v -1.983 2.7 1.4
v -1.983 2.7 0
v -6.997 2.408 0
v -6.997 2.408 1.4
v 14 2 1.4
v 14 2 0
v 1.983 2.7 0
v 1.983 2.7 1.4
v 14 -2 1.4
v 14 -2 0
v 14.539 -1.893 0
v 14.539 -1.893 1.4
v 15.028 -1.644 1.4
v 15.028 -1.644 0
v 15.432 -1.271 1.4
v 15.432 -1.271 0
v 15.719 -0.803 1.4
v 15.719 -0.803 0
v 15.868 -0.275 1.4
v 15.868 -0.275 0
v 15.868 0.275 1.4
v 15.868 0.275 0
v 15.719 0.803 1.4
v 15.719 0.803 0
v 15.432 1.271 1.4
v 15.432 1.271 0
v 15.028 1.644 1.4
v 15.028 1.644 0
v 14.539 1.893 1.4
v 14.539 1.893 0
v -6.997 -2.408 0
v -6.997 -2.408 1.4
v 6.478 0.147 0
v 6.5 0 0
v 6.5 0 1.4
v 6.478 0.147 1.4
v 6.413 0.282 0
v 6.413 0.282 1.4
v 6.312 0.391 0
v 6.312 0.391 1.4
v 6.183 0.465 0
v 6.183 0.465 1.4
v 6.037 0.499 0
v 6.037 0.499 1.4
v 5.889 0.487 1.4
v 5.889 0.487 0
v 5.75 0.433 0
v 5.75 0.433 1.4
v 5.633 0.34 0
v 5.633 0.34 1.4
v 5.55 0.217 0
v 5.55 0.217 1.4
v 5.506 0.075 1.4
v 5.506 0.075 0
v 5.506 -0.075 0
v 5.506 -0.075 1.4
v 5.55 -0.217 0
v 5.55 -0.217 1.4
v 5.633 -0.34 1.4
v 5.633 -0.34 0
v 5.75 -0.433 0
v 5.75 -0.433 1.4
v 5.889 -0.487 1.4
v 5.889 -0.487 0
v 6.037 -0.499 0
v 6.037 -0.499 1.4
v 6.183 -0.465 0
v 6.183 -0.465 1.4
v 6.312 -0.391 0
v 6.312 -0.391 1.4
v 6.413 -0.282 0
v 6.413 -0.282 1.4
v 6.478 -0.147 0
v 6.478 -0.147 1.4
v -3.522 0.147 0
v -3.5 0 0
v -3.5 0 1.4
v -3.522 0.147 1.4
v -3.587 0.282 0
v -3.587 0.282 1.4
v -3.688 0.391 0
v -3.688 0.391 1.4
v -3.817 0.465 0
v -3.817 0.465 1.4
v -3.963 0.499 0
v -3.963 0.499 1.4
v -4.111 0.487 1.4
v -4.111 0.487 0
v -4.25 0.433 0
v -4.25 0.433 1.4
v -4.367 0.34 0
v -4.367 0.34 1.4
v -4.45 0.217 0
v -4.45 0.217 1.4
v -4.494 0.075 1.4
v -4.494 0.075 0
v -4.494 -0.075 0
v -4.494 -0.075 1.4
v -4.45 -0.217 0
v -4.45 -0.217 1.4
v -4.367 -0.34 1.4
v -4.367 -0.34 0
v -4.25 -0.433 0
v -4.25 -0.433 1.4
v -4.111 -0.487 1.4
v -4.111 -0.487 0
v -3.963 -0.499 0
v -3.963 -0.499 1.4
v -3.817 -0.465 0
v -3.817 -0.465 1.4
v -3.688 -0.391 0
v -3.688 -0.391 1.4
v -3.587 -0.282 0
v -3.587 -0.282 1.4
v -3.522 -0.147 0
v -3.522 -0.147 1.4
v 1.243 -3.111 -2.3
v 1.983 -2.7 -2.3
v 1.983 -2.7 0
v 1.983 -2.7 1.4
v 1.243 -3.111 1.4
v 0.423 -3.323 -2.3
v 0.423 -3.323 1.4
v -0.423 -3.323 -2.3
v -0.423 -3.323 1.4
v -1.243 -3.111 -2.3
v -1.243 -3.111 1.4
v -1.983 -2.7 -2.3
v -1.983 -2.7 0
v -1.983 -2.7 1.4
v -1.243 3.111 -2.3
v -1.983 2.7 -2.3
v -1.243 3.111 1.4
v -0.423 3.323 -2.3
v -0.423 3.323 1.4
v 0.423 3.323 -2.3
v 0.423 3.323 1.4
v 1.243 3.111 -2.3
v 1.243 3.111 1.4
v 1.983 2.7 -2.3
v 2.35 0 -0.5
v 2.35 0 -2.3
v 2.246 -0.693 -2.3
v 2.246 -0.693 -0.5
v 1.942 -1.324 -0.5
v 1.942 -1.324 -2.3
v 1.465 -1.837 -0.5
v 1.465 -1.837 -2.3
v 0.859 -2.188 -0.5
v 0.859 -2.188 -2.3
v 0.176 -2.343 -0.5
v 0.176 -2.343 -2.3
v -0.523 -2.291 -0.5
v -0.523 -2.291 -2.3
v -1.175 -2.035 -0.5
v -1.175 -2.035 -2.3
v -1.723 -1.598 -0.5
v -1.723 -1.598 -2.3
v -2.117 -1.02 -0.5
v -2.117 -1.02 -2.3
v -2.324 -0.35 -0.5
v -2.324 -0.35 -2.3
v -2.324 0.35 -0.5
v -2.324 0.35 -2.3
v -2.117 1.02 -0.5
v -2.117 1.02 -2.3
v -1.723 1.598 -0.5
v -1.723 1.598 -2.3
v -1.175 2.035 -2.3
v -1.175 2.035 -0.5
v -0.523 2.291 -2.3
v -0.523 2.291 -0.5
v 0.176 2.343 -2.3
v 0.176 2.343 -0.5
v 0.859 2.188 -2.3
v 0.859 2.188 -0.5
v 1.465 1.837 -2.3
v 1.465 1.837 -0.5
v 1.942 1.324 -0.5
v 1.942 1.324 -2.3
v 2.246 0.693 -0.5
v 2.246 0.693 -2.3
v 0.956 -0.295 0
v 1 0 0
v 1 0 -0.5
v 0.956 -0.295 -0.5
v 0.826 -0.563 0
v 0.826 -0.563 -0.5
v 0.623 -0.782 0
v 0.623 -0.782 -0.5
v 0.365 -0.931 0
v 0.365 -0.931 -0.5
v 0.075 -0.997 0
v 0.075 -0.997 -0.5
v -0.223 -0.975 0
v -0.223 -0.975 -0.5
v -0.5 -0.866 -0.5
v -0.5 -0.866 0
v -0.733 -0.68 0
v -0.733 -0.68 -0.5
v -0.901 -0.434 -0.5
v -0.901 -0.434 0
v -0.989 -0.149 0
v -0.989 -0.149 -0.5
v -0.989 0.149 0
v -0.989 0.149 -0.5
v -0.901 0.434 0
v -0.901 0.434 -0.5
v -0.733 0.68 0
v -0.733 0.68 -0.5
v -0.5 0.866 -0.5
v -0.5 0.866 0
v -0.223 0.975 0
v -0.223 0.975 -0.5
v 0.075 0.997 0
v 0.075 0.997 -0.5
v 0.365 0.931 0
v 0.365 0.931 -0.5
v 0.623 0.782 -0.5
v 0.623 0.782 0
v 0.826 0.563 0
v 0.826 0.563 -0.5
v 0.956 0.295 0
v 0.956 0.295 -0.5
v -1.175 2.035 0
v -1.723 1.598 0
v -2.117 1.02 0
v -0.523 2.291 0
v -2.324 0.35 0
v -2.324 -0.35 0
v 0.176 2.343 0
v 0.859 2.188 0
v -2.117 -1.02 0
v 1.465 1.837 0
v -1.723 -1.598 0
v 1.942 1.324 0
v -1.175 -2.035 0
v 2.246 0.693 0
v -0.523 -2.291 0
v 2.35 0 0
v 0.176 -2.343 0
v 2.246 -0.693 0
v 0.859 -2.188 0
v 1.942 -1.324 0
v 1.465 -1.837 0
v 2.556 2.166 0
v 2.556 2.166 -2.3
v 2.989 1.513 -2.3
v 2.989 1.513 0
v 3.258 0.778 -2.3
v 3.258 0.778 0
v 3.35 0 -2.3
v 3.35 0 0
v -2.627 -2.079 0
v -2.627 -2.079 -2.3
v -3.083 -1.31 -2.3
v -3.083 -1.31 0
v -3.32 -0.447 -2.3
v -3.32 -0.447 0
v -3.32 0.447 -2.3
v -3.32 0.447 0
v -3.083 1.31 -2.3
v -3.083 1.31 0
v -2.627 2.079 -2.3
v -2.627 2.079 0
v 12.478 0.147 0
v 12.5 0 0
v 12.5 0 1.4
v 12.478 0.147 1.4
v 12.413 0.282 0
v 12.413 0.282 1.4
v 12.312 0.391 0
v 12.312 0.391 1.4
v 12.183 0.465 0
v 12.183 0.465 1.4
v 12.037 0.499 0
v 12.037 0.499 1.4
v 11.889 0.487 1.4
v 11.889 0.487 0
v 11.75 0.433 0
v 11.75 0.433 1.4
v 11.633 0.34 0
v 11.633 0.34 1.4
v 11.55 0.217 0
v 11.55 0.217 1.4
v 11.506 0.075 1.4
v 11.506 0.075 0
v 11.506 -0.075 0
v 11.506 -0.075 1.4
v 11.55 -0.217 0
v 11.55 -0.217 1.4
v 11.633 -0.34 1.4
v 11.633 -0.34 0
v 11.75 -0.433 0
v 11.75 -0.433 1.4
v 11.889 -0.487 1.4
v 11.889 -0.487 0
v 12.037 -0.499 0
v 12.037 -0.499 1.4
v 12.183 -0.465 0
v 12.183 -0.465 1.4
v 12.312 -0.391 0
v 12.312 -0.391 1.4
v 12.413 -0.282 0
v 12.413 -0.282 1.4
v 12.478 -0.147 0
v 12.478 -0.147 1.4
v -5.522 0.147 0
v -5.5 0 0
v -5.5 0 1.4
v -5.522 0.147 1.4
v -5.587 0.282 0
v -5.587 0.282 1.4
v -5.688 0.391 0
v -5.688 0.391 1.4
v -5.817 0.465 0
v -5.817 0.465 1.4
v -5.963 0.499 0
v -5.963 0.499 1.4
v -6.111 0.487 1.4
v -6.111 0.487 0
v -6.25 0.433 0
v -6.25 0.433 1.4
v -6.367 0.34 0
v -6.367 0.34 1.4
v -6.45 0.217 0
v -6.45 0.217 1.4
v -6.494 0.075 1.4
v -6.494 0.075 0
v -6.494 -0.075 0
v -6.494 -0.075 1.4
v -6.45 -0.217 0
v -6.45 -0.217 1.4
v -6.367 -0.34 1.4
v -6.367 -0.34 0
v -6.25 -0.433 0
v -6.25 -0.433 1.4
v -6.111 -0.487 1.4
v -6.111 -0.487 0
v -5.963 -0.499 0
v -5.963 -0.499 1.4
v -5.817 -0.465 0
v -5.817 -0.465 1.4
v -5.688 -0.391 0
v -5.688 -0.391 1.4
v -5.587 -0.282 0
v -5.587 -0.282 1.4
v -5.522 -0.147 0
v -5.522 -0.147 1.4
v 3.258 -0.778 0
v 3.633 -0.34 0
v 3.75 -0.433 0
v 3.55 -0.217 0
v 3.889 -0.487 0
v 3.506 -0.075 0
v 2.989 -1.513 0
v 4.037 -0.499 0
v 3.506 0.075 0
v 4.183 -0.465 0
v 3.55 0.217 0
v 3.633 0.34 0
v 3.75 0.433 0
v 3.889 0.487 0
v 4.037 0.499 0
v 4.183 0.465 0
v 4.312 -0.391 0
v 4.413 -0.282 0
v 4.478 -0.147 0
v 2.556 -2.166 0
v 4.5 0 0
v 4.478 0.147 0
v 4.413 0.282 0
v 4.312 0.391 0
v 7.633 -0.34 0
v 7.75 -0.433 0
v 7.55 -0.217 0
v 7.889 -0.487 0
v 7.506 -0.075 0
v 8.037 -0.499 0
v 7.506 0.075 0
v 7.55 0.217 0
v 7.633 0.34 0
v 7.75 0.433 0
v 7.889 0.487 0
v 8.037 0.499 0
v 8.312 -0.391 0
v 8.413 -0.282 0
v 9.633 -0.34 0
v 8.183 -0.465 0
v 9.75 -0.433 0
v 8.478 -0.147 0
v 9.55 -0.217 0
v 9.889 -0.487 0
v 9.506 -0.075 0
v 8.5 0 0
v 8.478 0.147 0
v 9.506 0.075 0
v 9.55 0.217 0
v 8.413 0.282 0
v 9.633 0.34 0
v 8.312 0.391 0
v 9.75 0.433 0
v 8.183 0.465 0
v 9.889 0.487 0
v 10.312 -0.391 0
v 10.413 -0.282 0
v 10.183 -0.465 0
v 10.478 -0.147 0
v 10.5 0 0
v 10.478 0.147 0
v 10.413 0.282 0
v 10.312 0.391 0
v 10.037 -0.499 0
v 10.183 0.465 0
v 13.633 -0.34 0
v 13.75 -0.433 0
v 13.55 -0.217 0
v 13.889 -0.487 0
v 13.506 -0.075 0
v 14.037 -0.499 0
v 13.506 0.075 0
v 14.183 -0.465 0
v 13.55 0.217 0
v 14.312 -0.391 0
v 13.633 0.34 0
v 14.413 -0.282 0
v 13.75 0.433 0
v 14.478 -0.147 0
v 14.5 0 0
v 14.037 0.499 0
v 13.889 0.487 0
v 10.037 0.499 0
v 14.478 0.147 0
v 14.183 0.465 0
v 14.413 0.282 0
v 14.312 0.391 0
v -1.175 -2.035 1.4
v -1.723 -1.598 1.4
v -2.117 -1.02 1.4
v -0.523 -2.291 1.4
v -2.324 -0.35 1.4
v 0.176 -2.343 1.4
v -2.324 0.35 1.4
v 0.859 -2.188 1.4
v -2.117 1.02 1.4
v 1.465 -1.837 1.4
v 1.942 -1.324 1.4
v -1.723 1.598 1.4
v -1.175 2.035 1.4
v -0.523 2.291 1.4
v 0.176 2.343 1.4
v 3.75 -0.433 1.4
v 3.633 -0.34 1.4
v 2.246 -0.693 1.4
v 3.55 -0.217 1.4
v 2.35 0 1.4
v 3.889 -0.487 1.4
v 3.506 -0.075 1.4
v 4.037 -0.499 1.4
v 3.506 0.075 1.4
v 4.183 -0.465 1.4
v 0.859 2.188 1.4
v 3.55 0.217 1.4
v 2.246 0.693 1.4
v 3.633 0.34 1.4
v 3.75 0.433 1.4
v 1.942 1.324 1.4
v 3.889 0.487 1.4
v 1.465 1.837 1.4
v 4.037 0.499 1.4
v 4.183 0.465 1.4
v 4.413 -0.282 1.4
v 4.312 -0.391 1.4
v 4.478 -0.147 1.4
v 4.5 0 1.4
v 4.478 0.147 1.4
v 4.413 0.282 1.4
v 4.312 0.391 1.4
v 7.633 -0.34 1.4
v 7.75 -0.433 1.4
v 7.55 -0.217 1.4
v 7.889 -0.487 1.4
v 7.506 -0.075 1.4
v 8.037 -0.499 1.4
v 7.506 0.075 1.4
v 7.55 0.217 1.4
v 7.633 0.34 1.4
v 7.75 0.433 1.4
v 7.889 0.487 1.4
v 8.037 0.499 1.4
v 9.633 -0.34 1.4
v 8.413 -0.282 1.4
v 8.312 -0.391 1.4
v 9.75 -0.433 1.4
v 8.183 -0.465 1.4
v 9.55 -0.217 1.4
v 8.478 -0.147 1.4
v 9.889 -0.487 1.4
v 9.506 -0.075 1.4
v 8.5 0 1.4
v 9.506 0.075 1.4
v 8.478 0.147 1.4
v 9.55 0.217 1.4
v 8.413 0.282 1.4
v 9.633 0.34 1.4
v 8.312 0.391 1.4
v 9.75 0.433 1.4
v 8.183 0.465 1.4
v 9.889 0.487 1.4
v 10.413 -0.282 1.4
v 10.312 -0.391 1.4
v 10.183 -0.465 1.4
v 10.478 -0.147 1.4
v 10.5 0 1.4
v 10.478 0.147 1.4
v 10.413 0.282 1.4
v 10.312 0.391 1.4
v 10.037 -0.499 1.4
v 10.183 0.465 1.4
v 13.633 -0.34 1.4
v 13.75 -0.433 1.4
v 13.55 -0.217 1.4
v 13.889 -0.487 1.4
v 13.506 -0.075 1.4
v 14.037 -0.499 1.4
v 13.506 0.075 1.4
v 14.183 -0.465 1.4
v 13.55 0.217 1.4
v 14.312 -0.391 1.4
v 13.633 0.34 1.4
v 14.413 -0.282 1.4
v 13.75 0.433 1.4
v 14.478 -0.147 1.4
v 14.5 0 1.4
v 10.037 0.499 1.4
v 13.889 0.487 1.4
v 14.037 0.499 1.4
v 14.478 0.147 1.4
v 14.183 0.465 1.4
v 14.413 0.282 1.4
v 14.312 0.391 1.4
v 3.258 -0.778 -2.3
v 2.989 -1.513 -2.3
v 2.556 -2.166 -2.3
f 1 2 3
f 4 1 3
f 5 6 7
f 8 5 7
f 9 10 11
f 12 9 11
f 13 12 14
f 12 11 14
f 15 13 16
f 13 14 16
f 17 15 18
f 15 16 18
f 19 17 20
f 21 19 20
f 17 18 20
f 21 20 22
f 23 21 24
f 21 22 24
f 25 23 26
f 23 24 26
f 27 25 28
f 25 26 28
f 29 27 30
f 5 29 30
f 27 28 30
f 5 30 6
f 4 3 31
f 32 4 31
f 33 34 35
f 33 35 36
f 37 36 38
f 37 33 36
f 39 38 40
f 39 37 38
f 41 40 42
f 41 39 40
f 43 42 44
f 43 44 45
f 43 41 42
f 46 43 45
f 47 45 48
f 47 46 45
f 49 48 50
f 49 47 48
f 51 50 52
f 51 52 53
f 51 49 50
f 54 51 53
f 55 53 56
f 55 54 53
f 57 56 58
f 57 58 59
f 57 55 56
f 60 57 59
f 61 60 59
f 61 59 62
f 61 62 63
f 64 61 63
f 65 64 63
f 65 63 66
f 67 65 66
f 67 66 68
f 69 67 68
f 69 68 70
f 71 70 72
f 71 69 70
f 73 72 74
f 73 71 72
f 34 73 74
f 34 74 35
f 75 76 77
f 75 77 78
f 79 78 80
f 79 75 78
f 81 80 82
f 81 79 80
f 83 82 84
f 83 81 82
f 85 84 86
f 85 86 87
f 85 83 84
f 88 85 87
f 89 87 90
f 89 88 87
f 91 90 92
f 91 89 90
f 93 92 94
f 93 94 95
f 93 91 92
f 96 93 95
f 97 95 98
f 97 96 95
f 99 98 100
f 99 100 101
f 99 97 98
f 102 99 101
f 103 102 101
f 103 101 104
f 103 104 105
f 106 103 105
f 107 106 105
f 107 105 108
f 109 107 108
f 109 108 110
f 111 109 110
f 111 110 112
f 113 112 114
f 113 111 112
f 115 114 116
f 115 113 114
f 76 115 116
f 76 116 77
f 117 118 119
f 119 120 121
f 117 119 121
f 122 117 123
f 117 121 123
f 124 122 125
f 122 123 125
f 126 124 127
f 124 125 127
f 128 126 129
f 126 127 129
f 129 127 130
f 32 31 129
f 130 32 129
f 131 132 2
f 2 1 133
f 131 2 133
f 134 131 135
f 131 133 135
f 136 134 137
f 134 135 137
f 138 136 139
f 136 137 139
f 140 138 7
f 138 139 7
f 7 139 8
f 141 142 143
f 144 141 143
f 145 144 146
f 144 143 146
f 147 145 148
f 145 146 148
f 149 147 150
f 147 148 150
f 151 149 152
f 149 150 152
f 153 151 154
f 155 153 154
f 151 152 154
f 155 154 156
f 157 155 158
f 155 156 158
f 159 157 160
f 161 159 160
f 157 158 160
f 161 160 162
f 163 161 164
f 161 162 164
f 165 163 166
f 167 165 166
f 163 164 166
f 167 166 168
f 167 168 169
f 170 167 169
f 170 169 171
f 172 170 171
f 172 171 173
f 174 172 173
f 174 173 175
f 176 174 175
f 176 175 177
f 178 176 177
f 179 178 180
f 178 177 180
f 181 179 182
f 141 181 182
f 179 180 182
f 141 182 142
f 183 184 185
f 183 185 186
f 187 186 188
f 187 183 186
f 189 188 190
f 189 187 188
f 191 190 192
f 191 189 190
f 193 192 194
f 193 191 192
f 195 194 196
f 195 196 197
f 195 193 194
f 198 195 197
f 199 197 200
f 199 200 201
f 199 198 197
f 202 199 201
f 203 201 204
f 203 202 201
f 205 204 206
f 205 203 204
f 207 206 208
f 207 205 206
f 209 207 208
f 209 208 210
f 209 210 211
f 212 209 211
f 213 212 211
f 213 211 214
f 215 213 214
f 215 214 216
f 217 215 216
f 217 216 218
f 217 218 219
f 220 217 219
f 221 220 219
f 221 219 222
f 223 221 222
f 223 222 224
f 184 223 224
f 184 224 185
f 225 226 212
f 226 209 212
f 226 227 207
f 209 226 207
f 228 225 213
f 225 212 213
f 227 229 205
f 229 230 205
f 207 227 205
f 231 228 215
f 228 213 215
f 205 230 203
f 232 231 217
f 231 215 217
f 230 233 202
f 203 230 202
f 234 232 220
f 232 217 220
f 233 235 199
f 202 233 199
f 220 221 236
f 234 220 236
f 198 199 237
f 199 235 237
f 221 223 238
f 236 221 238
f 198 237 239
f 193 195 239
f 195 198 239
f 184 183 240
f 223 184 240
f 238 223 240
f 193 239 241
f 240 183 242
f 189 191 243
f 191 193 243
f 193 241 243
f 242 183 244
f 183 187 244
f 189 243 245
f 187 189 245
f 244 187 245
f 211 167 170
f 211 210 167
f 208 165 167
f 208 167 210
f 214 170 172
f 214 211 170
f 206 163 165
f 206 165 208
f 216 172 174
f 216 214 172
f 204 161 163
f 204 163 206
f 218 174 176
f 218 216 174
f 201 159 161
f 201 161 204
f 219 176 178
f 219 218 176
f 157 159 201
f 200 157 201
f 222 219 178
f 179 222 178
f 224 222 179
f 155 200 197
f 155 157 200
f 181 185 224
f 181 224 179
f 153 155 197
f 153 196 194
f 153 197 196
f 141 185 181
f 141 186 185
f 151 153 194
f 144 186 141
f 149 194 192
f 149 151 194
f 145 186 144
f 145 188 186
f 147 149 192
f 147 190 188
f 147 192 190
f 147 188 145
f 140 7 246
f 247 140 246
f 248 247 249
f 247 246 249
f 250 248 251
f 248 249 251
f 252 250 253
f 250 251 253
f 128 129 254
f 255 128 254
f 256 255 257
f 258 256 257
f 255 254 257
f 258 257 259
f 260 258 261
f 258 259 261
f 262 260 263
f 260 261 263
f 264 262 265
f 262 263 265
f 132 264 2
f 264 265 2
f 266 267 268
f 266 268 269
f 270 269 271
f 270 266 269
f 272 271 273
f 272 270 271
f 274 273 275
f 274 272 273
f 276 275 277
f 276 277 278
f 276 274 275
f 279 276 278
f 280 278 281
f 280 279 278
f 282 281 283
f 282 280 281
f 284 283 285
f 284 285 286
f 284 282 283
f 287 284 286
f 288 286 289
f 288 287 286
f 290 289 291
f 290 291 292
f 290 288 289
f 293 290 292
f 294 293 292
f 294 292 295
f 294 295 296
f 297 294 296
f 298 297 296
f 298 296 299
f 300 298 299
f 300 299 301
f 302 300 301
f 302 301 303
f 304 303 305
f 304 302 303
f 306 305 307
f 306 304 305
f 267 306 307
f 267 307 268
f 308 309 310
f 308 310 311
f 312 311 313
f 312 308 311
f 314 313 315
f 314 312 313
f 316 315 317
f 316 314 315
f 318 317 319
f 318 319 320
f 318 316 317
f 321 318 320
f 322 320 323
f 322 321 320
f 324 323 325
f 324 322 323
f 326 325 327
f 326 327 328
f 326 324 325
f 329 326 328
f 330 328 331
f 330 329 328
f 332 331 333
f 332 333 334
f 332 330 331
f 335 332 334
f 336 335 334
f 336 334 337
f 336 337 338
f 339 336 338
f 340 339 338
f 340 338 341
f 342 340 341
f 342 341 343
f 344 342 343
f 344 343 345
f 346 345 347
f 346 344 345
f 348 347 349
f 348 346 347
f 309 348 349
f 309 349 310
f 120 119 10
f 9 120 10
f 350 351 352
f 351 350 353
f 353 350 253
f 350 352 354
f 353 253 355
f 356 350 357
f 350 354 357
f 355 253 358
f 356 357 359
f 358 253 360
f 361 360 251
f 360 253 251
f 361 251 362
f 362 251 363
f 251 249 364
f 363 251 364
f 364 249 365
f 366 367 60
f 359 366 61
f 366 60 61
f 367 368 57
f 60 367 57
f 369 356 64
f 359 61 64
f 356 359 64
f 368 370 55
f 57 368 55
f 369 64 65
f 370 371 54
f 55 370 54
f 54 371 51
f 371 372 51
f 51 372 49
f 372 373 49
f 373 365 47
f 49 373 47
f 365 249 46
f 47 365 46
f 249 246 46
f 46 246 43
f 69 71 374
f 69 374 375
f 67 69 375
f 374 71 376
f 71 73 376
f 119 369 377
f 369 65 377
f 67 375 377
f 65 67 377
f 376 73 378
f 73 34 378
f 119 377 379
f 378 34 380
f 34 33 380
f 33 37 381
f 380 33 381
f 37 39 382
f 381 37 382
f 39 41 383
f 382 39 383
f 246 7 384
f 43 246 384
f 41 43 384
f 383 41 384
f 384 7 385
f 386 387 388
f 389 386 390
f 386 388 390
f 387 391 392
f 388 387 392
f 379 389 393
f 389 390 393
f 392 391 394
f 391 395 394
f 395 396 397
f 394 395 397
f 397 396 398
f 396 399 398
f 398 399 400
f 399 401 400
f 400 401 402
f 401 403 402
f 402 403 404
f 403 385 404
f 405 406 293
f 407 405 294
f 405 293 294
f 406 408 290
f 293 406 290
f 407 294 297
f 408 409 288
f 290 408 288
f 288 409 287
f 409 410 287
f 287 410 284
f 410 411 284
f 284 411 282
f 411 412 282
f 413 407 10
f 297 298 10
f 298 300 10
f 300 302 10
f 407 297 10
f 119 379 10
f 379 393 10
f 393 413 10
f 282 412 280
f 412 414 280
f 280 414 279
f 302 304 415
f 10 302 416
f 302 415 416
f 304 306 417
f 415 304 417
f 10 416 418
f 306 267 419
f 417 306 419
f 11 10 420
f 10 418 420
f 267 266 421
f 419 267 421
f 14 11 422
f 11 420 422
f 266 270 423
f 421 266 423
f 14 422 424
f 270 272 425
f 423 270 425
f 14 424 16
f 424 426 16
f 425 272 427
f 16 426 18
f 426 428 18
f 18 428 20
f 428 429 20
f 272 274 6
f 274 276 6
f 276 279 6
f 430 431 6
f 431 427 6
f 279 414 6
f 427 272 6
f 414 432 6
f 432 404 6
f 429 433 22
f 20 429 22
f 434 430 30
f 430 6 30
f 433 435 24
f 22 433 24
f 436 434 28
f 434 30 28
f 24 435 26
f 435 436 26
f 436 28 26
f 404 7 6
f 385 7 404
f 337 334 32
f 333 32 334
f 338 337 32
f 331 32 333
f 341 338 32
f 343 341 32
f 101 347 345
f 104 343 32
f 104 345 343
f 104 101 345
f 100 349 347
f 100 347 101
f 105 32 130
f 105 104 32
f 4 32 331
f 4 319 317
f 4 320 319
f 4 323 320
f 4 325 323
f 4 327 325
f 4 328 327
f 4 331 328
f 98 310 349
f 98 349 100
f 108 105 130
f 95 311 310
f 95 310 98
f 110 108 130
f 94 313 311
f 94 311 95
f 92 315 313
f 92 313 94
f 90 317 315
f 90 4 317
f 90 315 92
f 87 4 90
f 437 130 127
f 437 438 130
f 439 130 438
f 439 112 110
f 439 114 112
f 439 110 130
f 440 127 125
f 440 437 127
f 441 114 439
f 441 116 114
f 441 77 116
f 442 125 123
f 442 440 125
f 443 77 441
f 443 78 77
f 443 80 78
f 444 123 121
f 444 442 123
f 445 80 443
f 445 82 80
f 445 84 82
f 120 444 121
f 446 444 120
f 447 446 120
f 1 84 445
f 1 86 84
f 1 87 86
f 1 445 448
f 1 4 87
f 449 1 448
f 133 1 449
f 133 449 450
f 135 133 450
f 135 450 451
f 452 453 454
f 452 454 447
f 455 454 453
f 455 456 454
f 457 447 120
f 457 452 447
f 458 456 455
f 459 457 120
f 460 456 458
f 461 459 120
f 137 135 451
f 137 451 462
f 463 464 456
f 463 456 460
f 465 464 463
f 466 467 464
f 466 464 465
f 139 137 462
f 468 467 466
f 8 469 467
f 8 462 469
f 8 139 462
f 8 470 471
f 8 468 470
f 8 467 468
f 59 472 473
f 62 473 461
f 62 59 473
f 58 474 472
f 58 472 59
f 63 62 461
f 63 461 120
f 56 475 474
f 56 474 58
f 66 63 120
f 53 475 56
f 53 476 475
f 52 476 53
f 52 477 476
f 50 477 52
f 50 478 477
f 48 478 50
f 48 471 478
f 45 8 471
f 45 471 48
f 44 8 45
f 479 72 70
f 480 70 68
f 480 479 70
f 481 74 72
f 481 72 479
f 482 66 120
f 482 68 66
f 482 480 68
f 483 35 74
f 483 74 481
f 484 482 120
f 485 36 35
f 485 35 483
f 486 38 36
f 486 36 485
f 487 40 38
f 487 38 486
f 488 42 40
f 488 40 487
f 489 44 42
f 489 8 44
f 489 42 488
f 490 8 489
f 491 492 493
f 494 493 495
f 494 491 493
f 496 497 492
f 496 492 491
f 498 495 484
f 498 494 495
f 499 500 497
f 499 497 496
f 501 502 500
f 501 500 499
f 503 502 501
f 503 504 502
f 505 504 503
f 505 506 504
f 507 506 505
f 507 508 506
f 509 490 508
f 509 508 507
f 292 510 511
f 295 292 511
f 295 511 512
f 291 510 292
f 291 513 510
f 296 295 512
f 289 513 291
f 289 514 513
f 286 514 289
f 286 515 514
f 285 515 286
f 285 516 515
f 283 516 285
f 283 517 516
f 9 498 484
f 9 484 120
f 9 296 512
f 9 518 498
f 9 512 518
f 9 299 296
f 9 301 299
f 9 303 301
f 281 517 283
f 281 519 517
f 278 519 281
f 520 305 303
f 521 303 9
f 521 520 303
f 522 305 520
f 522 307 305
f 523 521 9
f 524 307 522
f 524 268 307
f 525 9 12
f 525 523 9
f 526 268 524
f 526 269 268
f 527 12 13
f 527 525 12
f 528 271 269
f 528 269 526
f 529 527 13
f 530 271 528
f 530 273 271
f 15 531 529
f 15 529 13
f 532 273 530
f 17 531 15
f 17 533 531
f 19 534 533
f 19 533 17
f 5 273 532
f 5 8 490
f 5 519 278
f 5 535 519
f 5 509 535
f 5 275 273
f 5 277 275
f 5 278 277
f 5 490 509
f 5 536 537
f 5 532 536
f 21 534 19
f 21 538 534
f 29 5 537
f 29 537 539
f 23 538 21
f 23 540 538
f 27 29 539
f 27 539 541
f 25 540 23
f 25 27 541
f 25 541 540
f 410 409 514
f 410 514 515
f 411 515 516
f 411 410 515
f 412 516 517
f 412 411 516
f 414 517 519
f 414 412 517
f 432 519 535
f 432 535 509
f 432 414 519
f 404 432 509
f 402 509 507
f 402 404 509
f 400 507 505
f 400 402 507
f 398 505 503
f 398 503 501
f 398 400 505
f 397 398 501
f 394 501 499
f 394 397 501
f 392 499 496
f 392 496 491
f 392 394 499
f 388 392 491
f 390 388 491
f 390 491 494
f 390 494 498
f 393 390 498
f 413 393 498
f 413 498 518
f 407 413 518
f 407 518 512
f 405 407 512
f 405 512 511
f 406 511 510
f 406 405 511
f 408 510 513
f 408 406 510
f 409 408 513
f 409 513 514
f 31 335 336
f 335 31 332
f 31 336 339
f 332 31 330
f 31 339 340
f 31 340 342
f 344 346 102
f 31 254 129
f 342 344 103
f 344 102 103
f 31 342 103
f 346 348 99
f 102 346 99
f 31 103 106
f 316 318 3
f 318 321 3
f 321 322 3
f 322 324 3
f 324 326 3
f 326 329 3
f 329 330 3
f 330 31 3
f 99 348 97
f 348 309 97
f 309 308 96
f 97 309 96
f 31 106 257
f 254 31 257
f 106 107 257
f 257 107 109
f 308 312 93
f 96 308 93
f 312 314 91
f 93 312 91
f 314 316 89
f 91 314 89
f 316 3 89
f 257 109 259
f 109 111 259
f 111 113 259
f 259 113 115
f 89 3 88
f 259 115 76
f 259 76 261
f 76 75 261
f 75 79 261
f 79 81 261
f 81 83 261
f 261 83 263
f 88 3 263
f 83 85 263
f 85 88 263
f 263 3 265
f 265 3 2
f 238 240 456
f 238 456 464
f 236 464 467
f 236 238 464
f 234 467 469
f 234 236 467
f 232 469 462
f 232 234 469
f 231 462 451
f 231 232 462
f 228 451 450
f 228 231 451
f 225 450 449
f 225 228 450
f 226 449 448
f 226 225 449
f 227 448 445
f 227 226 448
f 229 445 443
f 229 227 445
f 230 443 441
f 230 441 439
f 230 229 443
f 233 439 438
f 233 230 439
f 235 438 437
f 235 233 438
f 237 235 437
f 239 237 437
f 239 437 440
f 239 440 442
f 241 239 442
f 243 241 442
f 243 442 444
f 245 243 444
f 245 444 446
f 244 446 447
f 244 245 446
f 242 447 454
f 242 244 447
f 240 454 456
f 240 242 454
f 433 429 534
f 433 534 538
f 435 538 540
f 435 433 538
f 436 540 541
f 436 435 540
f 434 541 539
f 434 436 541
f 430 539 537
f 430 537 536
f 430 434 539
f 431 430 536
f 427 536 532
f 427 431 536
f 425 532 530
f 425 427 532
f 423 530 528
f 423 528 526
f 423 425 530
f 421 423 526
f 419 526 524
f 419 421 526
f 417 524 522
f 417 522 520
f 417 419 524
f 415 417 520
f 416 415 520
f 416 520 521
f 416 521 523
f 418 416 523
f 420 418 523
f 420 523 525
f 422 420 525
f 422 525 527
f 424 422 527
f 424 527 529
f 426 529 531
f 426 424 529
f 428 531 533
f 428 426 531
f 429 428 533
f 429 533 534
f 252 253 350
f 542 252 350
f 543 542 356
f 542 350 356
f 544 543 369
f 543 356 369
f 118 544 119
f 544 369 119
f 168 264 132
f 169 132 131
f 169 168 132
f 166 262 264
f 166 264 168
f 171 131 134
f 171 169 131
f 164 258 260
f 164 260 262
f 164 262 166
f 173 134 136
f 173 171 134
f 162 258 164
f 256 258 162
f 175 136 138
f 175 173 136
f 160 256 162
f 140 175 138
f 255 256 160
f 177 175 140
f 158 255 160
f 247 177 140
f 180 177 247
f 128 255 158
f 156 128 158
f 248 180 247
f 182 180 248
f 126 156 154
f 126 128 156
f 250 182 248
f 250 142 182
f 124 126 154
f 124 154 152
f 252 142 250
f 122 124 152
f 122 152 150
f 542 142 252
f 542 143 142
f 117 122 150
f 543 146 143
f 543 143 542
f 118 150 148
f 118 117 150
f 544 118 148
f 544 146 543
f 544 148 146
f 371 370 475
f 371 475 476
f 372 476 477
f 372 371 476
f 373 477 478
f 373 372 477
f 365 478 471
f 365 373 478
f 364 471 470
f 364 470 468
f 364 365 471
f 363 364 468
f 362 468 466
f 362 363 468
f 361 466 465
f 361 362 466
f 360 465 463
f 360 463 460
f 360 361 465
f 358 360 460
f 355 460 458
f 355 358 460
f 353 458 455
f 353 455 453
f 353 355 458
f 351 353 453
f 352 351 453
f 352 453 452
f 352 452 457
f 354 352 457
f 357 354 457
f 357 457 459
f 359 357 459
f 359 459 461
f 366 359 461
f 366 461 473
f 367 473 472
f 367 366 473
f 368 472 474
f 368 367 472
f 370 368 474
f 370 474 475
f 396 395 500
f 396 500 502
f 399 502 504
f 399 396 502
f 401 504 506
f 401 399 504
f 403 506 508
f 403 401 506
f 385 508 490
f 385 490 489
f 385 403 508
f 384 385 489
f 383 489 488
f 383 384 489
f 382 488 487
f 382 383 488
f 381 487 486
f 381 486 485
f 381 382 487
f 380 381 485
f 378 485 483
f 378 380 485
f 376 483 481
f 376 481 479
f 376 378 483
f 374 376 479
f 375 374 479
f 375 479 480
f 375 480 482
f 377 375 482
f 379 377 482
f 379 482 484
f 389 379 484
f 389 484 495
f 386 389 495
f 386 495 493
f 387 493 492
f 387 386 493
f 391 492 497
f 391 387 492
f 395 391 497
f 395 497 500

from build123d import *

# Parameters (mm, degrees)
F0_R     = 2.35
F0_R_2   = 0.5
F1_DEPTH = 1.4
F2_R     = 2.35
F2_R_2   = 1
F3_DEPTH = 2.3
F4_R     = 2.35
F4_R_2   = 1
F5_DEPTH = 1.8


with BuildPart() as f1:
    # F0 (on Top) → F1 (new body)
    with BuildSketch(Plane.XY):
        with BuildLine():
            ThreePointArc((1.9830532015, -2.7), (2.9887897404, -1.5131542841), (3.35, 0))
            ThreePointArc((3.35, 0), (2.9887897404, 1.5131542841), (1.9830532015, 2.7))
            ThreePointArc((1.9830532015, 2.7), (0, 3.35), (-1.9830532015, 2.7))
            ThreePointArc((-1.9830532015, 2.7), (-3.35, 0), (-1.9830532015, -2.7))
            ThreePointArc((-1.9830532015, -2.7), (0, -3.35), (1.9830532015, -2.7))
        make_face()
        Circle(F0_R, mode=Mode.SUBTRACT)
        with BuildLine():
            ThreePointArc((1.9830532015, 2.7), (2.9887897404, 1.5131542841), (3.35, 0))
            ThreePointArc((3.35, 0), (2.9887897404, -1.5131542841), (1.9830532015, -2.7))
            Line((1.9830532015, -2.7), (14, -2))
            ThreePointArc((14, -2), (15.886888175, 0), (14, 2))
            Line((14, 2), (1.9830532015, 2.7))
        make_face()
        with Locations((4, 0)):
            Circle(F0_R_2, mode=Mode.SUBTRACT)
        with Locations((6, 0)):
            Circle(F0_R_2, mode=Mode.SUBTRACT)
        with Locations((8, 0)):
            Circle(F0_R_2, mode=Mode.SUBTRACT)
        with Locations((10, 0)):
            Circle(F0_R_2, mode=Mode.SUBTRACT)
        with Locations((12, 0)):
            Circle(F0_R_2, mode=Mode.SUBTRACT)
        with Locations((14, 0)):
            Circle(F0_R_2, mode=Mode.SUBTRACT)
        with BuildLine():
            ThreePointArc((-1.9830532015, -2.7), (-3.35, 0), (-1.9830532015, 2.7))
            Line((-1.9830532015, 2.7), (-6.9970610693, 2.4079286805))
            Line((-6.9970610693, 2.4079286805), (-6.9970610693, -2.4079286805))
            Line((-6.9970610693, -2.4079286805), (-1.9830532015, -2.7))
        make_face()
        with Locations((-6, 0)):
            Circle(F0_R_2, mode=Mode.SUBTRACT)
        with Locations((-4, 0)):
            Circle(F0_R_2, mode=Mode.SUBTRACT)
    extrude(amount=F1_DEPTH)

    # F2 (on face) → F3 (join)
    with BuildSketch(Plane(origin=(0, 0, 0), x_dir=(1, 0, 0), z_dir=(0, 0, -1))):
        with BuildLine():
            ThreePointArc((1.9830532015, -2.7), (2.9887897404, -1.5131542841), (3.35, 0))
            ThreePointArc((3.35, 0), (2.9887897404, 1.5131542841), (1.9830532015, 2.7))
            ThreePointArc((1.9830532015, 2.7), (0, 3.35), (-1.9830532015, 2.7))
            ThreePointArc((-1.9830532015, 2.7), (-3.35, 0), (-1.9830532015, -2.7))
            ThreePointArc((-1.9830532015, -2.7), (0, -3.35), (1.9830532015, -2.7))
        make_face()
        Circle(F2_R, mode=Mode.SUBTRACT)
        Circle(F2_R)
        Circle(F2_R_2, mode=Mode.SUBTRACT)
    extrude(amount=F3_DEPTH)

    # F4 (on face) → F5 (cut)
    with BuildSketch(Plane(origin=(0, 0, -2.3), x_dir=(1, 0, 0), z_dir=(0, 0, -1))):
        Circle(F4_R)
        Circle(F4_R_2, mode=Mode.SUBTRACT)
    extrude(amount=-F5_DEPTH, mode=Mode.SUBTRACT)


solid = f1.part
